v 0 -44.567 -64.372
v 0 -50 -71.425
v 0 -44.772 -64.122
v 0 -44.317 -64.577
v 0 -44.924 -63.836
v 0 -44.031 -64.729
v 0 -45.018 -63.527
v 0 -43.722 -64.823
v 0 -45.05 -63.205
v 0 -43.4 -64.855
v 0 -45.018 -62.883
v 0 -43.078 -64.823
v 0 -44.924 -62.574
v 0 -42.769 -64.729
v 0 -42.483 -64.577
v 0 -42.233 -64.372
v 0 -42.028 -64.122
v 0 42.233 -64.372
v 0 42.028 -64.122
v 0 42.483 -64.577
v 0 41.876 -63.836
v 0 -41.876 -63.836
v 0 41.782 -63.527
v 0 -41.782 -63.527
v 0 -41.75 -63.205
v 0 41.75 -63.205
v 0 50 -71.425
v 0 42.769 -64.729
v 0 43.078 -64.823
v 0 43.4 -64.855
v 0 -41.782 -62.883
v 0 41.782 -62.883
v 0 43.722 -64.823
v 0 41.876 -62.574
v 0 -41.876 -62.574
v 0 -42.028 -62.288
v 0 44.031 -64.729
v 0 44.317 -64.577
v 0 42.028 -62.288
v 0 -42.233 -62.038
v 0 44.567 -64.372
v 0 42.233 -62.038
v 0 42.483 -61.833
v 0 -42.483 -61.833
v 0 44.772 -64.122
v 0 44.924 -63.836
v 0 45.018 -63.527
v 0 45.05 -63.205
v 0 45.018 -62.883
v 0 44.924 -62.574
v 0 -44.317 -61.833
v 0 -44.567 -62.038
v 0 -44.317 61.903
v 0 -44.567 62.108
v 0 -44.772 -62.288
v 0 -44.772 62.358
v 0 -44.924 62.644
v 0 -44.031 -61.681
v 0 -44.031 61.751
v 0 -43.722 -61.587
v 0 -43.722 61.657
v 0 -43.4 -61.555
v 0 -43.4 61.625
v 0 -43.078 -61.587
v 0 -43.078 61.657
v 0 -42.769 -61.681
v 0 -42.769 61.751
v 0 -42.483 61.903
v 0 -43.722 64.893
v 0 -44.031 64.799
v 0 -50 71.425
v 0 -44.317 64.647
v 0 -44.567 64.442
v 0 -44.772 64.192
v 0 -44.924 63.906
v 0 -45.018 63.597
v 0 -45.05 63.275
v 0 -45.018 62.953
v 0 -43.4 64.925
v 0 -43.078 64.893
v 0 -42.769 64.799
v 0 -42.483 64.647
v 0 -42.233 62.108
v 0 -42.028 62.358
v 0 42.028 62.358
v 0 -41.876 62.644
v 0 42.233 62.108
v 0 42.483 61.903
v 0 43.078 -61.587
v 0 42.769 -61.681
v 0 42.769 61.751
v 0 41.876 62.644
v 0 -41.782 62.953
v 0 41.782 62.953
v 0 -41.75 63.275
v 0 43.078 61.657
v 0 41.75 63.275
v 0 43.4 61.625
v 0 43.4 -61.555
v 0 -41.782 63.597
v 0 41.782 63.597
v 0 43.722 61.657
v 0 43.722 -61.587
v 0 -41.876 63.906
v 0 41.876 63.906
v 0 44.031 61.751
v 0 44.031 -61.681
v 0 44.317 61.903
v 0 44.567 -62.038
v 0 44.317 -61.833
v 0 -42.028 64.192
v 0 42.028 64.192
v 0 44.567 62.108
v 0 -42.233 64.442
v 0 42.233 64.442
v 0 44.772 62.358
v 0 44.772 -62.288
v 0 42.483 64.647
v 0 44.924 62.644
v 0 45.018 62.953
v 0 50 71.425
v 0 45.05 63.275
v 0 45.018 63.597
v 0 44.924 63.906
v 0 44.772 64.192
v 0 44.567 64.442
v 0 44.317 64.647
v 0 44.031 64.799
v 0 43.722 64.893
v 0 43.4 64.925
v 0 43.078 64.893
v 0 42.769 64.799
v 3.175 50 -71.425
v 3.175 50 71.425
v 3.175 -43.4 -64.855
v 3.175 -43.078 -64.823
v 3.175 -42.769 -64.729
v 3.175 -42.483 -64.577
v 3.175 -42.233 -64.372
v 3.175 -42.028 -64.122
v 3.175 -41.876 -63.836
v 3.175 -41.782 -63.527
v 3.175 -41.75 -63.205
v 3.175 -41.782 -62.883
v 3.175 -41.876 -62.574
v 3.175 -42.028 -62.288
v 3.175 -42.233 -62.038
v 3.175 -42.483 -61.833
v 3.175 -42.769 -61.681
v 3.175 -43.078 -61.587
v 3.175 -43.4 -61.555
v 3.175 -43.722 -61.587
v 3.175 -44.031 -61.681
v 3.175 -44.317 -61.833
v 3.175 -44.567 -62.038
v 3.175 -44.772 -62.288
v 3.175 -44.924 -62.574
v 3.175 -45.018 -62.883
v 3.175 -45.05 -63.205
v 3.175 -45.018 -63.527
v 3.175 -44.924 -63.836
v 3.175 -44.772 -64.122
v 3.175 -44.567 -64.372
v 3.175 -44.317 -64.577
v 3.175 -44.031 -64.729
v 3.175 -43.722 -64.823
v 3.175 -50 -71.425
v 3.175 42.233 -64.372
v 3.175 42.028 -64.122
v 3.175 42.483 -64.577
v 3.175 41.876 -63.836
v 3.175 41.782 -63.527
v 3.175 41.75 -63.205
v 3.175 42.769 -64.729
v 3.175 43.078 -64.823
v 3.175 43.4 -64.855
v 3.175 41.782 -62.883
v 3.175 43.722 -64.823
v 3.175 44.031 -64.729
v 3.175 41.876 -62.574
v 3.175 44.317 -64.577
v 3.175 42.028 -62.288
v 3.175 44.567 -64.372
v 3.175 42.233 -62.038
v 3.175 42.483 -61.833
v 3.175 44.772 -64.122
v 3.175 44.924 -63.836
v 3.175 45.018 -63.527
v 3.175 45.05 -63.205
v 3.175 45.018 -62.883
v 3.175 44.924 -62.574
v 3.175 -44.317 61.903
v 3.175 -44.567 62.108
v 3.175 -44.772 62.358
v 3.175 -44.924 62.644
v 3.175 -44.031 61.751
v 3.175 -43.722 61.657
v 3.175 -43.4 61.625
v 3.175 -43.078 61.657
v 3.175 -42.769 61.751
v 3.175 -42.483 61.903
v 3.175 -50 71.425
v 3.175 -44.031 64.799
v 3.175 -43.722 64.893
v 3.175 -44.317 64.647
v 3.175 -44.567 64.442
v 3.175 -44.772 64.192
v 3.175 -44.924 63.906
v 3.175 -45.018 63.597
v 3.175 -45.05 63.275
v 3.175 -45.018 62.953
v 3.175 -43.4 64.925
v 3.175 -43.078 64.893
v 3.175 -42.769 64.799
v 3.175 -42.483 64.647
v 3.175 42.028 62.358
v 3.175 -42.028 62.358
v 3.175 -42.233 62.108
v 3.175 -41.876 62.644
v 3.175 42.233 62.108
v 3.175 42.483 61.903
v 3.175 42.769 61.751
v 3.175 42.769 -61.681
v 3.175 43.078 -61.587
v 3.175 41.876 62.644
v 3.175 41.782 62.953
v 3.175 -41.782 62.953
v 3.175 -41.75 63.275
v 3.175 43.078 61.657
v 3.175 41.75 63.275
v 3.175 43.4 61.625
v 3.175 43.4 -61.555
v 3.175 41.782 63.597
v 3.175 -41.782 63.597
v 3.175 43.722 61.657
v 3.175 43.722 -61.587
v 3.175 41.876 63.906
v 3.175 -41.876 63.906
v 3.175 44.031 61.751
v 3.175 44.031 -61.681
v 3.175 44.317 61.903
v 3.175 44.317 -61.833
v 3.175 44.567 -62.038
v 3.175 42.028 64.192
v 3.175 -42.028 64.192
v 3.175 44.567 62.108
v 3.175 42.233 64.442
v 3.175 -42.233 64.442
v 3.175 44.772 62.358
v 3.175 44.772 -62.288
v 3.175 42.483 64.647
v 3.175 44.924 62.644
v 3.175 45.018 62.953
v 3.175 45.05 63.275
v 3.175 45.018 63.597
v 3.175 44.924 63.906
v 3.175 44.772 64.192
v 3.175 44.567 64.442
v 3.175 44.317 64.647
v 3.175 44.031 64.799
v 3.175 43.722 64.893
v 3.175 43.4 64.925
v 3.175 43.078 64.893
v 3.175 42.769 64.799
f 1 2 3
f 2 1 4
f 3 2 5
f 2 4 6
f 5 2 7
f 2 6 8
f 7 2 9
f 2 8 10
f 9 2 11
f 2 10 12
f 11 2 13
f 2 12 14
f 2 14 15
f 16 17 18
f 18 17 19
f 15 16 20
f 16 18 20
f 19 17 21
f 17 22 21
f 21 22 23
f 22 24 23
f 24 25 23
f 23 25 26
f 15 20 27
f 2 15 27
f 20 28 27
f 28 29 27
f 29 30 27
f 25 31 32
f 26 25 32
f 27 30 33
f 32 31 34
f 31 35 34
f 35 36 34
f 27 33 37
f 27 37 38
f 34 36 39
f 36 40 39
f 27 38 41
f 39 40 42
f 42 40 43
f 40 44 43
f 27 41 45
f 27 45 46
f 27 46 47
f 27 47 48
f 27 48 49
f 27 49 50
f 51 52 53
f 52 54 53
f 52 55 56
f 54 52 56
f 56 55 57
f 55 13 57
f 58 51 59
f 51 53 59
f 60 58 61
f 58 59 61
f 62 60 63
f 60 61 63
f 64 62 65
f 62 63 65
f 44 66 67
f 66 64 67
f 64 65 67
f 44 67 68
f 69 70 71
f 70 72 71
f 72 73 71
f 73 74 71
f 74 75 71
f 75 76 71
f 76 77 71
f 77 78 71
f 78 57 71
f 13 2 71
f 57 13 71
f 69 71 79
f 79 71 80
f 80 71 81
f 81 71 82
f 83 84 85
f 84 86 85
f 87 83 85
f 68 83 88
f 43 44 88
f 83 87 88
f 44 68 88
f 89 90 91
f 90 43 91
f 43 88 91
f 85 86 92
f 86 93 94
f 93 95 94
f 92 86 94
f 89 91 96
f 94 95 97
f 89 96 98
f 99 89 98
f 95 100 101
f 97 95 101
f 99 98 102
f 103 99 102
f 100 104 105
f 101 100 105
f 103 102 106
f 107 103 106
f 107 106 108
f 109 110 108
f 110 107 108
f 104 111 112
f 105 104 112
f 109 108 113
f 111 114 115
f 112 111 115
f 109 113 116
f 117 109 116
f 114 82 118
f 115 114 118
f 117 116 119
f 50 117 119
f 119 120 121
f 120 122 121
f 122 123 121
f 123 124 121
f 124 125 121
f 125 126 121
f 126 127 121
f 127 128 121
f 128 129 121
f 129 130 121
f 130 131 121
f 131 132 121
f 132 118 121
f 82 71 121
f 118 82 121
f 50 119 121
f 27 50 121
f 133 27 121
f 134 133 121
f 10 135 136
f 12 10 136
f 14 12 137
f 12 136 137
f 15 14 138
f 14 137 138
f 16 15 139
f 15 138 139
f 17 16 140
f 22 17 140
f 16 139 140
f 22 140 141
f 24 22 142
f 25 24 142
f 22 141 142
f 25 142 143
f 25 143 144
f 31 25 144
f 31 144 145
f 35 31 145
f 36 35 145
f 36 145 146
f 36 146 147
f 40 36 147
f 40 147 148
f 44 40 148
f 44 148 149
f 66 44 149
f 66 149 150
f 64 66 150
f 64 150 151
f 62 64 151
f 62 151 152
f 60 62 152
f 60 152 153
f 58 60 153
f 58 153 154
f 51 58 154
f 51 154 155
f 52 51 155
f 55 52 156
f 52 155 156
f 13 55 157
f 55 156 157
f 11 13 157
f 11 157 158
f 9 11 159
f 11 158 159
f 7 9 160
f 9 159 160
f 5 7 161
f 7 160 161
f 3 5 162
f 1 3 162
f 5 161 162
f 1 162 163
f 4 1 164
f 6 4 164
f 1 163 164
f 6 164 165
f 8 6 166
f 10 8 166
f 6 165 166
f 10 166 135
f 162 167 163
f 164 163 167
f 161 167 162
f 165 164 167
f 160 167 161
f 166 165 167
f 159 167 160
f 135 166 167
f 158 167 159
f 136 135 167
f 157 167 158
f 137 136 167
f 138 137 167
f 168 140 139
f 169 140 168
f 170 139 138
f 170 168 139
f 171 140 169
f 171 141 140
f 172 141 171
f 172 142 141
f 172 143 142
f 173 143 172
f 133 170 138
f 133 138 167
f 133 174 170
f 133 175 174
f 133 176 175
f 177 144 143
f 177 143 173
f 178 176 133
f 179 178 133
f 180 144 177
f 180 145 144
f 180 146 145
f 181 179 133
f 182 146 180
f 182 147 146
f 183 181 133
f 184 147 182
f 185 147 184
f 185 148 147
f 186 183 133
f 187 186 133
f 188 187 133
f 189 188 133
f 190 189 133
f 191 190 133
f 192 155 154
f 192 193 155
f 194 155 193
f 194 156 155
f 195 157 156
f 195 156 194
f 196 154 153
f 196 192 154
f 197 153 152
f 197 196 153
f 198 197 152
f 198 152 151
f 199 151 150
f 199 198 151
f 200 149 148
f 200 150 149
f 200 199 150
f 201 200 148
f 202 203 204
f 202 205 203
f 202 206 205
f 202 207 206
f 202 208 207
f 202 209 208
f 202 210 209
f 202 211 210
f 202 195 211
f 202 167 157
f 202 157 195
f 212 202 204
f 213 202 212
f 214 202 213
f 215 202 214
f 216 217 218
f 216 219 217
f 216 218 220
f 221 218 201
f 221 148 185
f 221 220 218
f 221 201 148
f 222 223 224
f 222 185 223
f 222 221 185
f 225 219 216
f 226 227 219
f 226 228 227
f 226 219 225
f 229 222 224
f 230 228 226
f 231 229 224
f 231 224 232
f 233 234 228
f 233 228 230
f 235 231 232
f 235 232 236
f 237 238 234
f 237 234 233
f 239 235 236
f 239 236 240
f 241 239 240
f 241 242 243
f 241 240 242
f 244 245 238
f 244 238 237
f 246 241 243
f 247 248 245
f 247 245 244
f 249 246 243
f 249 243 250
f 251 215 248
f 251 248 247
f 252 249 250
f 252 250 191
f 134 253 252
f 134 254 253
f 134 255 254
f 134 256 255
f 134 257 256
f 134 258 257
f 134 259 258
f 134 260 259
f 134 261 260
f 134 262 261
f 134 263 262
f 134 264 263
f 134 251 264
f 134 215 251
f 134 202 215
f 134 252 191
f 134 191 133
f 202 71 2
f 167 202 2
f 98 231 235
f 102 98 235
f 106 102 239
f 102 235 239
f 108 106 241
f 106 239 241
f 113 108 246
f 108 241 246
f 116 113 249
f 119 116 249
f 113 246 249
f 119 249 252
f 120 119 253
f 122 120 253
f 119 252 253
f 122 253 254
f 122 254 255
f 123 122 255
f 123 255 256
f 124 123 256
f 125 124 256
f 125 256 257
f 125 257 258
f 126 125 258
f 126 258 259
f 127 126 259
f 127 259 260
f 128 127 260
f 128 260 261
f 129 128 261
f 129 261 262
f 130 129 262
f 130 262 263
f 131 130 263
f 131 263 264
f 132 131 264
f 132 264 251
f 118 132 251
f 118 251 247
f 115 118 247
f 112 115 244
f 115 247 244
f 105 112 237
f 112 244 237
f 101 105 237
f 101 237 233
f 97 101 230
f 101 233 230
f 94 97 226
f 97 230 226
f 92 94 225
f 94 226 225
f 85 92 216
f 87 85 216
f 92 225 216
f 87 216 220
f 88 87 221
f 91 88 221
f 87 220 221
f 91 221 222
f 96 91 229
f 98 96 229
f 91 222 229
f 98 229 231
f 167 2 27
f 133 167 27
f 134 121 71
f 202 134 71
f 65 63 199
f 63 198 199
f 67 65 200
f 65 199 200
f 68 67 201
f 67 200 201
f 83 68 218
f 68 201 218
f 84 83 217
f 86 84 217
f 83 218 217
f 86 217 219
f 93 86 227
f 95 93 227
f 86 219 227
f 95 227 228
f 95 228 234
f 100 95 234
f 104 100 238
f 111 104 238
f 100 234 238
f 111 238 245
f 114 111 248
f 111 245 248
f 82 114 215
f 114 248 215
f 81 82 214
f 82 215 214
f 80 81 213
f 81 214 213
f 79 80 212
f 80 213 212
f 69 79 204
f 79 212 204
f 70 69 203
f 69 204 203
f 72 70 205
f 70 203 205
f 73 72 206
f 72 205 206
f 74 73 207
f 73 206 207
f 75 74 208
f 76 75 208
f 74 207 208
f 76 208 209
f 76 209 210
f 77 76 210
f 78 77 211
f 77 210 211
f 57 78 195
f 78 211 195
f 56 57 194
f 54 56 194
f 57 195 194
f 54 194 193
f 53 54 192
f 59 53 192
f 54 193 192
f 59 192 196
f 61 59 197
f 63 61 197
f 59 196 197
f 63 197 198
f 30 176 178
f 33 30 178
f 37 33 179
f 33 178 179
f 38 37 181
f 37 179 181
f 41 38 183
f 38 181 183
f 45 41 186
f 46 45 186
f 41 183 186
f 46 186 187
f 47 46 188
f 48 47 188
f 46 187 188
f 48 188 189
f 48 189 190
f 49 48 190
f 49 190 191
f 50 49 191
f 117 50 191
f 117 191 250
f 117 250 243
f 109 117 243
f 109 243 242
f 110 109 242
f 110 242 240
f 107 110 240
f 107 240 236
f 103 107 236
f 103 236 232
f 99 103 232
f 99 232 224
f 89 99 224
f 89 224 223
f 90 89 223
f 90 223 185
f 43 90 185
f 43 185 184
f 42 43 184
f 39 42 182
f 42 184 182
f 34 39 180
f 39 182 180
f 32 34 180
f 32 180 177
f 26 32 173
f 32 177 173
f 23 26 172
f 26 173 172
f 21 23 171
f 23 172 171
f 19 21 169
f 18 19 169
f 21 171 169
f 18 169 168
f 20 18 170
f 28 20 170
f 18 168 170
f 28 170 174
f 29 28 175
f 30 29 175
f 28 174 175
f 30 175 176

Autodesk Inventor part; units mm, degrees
ref_plane "YZ Plane" through (0, 0, 0) normal (1, 0, 0) x (0, 1, 0)
ref_plane "XZ Plane" through (0, 0, 0) normal (0, 1, 0) x (-1, 0, 0)
ref_plane "XY Plane" through (0, 0, 0) normal (0, 0, 1) x (1, 0, 0)
sketch "Sketch1" plane through (0, 0, 0) normal (1, 0, 0) x (0, 1, 0)
  line L0 (50, 71.425) -> (-50, 71.425)
  line L1 (-50, 71.425) -> (-50, -71.425)
  line L2 (-50, -71.425) -> (50, -71.425)
  line L3 (50, -71.425) -> (50, 71.425)
  line L4 (50, 71.425) -> (-50, -71.425) construction
  line L5 (-50, 71.425) -> (50, -71.425) construction
  point P0 (0, 0)
extrude "Side_Base" add sketch "Sketch1" along normal blind 3.175
sketch "Sketch2" plane through (3.175, 0, 0) normal (1, 0, 0) x (0, 0, -1)
  circle A0 centre (-63.275, 43.4) radius 1.65
  circle A1 centre (63.205, 43.4) radius 1.65
  circle A2 centre (63.205, -43.4) radius 1.65
  circle A3 centre (-63.275, -43.4) radius 1.65
  line L0 (71.425, 50) -> (-71.425, 50) projected
  line L1 (-71.425, 50) -> (-71.425, -50) projected
  line L2 (71.425, -50) -> (71.425, 50) projected
  line L3 (-71.425, -50) -> (71.425, -50) projected
  point P0 (0, 0)
  dimension "d5" = 6.6
  dimension "d6" = 8.15
  dimension "d8" = 6.6
  dimension "d19" = 126.48
  dimension "d20" = 8.22
extrude "Joint_Holes" cut sketch "Sketch2" along normal through all both and the other way through all contours A0 | A1 | A2 | A3
equation "\"d8\" = d5"
properties part number "VP-01" material "Wood (Cherry)"
